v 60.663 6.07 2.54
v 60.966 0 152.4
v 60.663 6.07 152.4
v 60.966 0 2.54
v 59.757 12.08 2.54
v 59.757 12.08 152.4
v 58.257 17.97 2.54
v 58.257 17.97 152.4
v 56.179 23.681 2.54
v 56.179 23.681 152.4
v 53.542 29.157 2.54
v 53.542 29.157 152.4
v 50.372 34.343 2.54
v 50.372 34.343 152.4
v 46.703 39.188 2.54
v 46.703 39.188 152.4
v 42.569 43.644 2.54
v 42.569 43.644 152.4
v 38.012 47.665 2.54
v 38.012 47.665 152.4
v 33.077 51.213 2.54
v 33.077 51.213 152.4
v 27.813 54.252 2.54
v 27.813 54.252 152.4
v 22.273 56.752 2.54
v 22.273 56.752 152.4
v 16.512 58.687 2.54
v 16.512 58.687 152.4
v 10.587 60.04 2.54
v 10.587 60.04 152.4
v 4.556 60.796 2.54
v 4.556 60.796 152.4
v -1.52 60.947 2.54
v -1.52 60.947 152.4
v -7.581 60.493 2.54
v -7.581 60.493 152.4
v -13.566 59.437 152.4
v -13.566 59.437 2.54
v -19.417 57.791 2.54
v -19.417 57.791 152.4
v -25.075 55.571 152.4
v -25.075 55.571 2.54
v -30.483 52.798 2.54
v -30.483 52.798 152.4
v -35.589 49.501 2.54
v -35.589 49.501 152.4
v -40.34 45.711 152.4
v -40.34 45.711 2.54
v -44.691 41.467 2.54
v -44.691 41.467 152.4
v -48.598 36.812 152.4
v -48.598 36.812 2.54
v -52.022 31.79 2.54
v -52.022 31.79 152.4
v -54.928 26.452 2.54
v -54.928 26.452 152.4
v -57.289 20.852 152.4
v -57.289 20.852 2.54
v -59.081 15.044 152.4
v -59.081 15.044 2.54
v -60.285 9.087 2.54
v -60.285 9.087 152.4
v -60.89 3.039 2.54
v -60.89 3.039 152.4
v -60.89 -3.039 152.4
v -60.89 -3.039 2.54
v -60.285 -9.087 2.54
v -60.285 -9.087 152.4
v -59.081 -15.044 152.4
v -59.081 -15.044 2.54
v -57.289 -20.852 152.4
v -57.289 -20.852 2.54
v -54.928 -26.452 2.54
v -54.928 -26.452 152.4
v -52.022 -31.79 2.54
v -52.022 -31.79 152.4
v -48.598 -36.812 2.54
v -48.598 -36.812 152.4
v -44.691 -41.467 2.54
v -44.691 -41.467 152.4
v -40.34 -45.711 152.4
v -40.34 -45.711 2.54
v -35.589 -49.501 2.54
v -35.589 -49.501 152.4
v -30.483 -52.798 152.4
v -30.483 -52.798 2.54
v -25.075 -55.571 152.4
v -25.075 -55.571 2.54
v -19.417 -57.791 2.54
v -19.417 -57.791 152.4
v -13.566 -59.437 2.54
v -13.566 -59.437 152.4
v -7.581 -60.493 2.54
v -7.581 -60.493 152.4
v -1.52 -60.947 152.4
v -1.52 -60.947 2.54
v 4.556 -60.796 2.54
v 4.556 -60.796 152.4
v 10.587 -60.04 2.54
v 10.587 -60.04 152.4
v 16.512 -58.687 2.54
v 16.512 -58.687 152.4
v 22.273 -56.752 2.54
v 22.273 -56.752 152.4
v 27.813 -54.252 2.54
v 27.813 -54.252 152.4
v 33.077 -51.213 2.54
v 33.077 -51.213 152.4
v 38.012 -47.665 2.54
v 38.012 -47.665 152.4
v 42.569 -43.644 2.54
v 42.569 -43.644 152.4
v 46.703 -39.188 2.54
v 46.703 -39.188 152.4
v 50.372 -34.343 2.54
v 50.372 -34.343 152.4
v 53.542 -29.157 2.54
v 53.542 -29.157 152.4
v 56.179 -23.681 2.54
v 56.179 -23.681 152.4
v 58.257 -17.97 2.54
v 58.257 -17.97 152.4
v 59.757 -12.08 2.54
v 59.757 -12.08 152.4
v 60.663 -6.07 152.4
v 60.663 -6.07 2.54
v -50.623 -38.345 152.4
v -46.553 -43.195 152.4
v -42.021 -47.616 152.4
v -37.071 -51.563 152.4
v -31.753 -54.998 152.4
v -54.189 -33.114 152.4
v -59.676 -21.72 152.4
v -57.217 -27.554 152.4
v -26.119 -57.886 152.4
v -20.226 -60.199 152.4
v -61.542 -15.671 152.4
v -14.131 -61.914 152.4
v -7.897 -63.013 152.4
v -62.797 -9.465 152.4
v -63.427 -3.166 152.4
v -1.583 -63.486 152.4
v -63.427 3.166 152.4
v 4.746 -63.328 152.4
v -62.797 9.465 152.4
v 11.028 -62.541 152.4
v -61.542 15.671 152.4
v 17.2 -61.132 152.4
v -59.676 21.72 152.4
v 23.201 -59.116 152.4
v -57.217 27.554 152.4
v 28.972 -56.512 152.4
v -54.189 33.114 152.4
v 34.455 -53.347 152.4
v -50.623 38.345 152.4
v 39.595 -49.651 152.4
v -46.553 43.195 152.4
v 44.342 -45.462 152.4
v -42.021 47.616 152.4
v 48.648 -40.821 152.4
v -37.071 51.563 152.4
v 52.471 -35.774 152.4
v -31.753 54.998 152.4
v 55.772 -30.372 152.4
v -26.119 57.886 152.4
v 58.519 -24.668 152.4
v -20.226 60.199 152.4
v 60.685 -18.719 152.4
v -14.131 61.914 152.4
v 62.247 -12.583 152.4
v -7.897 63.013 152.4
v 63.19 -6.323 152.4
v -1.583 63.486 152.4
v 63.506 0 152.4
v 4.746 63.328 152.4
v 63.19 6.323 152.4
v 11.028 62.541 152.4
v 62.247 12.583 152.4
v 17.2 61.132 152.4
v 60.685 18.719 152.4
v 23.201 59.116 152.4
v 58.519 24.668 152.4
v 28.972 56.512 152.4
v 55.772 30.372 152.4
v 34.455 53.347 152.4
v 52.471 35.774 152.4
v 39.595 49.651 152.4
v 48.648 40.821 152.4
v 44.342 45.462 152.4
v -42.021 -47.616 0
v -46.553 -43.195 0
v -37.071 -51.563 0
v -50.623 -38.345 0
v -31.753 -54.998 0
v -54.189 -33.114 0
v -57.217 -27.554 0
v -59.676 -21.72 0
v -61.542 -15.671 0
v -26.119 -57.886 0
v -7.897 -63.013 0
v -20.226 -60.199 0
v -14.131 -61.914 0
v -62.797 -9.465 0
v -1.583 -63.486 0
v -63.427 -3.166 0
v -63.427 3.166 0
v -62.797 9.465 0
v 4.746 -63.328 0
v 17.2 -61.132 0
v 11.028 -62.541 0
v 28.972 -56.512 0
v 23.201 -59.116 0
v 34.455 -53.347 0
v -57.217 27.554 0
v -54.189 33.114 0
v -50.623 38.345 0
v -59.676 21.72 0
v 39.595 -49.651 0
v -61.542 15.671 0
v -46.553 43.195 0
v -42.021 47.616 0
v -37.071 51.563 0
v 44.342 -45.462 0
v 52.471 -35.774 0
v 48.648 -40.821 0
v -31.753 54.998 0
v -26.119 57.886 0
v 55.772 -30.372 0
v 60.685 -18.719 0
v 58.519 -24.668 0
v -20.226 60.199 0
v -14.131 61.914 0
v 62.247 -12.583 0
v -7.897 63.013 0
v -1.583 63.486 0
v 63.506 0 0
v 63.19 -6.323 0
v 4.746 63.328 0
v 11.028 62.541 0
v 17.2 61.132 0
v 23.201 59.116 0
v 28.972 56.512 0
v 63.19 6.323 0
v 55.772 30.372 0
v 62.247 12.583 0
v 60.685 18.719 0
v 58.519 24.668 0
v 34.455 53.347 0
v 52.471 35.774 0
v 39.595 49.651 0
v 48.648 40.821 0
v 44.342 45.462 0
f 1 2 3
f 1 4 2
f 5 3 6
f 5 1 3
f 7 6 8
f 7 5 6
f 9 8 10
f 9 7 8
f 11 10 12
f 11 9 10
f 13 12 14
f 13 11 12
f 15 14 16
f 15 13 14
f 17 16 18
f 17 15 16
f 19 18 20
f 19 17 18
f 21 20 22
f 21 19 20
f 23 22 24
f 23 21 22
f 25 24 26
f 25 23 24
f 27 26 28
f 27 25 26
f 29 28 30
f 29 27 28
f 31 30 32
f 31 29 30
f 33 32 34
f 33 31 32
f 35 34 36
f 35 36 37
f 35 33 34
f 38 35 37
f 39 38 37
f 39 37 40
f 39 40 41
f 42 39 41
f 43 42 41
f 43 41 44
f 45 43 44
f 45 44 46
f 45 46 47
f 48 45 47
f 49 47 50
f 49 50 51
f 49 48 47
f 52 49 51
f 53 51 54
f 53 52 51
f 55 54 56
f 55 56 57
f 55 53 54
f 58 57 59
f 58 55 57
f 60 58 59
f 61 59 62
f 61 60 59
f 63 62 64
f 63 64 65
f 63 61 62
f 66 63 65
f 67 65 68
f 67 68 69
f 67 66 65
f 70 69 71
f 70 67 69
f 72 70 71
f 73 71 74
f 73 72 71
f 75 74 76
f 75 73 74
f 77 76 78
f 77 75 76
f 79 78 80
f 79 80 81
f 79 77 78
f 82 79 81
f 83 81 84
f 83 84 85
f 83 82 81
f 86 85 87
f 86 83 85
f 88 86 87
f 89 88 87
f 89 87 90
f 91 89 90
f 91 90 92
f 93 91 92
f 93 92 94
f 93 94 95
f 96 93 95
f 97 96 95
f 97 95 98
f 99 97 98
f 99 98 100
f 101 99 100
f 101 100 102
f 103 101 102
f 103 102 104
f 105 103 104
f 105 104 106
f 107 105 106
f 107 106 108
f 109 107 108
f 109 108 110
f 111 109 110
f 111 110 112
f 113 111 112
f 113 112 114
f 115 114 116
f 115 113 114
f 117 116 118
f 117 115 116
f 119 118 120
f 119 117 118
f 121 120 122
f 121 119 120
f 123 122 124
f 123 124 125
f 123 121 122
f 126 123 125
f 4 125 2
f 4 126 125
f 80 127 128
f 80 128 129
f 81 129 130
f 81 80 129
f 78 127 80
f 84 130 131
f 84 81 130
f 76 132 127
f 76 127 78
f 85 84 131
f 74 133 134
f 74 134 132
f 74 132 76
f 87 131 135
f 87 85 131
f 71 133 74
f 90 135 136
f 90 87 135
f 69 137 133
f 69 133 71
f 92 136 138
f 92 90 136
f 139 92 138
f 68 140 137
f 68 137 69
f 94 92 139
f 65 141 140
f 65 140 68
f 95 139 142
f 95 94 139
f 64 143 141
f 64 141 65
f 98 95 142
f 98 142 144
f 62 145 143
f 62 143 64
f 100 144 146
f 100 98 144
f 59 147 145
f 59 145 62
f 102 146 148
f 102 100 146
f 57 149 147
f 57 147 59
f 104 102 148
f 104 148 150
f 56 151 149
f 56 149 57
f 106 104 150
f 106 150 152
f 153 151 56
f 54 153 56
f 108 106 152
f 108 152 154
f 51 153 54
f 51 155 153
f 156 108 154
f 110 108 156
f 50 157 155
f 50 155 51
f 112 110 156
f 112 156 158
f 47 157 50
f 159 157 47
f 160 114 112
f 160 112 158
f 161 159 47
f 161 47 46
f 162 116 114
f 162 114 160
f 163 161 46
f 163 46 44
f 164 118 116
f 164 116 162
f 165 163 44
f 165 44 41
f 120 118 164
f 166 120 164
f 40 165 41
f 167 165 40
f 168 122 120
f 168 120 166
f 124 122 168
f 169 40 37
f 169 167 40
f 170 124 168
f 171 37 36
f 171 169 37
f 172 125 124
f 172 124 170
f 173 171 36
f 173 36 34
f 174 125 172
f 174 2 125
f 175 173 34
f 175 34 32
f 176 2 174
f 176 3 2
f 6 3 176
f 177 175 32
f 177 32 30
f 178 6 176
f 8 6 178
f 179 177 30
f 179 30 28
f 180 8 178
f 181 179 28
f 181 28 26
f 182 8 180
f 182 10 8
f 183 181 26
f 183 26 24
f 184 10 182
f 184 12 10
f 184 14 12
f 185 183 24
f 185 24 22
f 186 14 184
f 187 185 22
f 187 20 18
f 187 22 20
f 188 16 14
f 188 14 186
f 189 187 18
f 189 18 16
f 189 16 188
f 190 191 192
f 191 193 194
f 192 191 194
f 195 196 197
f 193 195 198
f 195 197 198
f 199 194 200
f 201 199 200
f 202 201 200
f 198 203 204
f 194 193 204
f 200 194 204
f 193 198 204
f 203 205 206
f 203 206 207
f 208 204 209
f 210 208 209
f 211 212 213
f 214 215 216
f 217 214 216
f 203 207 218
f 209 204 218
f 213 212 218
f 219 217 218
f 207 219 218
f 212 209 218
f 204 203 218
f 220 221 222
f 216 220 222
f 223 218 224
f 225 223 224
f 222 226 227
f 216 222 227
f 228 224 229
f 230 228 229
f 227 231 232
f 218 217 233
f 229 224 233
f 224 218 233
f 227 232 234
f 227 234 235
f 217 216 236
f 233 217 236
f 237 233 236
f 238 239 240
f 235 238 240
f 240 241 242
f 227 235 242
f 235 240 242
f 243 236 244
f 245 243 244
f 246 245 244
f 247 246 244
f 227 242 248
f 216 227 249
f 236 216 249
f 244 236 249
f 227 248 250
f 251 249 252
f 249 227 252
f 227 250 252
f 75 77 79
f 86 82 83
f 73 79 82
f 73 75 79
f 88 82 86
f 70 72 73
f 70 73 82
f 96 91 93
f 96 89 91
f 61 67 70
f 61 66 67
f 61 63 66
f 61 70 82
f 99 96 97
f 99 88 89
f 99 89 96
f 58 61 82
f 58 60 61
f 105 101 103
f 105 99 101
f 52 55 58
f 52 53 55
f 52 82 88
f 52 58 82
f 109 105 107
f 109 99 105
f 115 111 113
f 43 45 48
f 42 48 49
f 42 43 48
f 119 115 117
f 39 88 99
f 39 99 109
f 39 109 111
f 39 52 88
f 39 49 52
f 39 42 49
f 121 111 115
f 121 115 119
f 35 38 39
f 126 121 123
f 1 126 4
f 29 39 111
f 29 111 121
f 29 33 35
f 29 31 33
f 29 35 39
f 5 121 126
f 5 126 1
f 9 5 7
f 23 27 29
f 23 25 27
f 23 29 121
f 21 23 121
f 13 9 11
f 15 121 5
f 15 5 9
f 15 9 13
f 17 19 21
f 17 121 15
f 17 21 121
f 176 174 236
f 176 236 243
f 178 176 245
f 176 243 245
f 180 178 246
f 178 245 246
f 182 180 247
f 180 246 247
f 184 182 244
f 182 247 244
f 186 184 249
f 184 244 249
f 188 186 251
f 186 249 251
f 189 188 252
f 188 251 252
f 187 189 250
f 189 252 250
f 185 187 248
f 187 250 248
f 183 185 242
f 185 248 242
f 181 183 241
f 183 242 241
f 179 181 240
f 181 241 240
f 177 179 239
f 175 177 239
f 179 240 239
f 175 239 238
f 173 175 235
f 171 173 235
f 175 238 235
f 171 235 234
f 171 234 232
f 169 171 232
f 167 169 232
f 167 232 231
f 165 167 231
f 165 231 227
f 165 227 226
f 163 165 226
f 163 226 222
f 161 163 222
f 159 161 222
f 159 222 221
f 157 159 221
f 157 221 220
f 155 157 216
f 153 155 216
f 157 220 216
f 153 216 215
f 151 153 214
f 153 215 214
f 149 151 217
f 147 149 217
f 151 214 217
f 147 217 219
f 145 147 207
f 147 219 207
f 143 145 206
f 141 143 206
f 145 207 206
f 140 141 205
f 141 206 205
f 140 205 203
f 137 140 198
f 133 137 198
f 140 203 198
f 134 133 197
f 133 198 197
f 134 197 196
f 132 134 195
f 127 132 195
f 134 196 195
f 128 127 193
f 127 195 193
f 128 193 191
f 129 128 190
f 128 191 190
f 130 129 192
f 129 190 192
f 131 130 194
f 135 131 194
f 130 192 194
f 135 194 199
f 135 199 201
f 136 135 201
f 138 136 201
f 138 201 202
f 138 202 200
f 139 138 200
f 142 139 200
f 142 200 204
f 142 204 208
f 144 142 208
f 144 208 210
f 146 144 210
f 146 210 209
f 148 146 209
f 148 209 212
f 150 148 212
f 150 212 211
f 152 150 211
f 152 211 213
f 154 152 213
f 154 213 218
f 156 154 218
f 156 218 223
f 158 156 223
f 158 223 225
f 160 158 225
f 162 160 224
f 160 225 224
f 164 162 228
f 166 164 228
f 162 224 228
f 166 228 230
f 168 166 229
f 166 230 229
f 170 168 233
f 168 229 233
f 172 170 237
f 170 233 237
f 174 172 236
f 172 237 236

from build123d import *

# Parameters (mm, degrees)
F0_R     = 63.5059965163
F1_DEPTH = 76.2
F2_T     = -2.54
F3_DEPTH = 76.2


with BuildPart() as f1:
    # F0 (on Top) → F1 (new body)
    with BuildSketch(Plane.XY):
        Circle(F0_R)
    extrude(amount=F1_DEPTH)

    # F2
    f2_openings = [f1.faces().sort_by_distance(p)[0] for p in [
        (0, 0, 76.2),
    ]]
    offset(amount=F2_T, openings=f2_openings)

    # F3 (add): a face of the model
    f3_faces = [f1.faces().sort_by_distance(p)[0] for p in [
        (-61.709775685, 0, 76.2),
    ]]
    extrude(f3_faces, amount=F3_DEPTH)


solid = f1.part
